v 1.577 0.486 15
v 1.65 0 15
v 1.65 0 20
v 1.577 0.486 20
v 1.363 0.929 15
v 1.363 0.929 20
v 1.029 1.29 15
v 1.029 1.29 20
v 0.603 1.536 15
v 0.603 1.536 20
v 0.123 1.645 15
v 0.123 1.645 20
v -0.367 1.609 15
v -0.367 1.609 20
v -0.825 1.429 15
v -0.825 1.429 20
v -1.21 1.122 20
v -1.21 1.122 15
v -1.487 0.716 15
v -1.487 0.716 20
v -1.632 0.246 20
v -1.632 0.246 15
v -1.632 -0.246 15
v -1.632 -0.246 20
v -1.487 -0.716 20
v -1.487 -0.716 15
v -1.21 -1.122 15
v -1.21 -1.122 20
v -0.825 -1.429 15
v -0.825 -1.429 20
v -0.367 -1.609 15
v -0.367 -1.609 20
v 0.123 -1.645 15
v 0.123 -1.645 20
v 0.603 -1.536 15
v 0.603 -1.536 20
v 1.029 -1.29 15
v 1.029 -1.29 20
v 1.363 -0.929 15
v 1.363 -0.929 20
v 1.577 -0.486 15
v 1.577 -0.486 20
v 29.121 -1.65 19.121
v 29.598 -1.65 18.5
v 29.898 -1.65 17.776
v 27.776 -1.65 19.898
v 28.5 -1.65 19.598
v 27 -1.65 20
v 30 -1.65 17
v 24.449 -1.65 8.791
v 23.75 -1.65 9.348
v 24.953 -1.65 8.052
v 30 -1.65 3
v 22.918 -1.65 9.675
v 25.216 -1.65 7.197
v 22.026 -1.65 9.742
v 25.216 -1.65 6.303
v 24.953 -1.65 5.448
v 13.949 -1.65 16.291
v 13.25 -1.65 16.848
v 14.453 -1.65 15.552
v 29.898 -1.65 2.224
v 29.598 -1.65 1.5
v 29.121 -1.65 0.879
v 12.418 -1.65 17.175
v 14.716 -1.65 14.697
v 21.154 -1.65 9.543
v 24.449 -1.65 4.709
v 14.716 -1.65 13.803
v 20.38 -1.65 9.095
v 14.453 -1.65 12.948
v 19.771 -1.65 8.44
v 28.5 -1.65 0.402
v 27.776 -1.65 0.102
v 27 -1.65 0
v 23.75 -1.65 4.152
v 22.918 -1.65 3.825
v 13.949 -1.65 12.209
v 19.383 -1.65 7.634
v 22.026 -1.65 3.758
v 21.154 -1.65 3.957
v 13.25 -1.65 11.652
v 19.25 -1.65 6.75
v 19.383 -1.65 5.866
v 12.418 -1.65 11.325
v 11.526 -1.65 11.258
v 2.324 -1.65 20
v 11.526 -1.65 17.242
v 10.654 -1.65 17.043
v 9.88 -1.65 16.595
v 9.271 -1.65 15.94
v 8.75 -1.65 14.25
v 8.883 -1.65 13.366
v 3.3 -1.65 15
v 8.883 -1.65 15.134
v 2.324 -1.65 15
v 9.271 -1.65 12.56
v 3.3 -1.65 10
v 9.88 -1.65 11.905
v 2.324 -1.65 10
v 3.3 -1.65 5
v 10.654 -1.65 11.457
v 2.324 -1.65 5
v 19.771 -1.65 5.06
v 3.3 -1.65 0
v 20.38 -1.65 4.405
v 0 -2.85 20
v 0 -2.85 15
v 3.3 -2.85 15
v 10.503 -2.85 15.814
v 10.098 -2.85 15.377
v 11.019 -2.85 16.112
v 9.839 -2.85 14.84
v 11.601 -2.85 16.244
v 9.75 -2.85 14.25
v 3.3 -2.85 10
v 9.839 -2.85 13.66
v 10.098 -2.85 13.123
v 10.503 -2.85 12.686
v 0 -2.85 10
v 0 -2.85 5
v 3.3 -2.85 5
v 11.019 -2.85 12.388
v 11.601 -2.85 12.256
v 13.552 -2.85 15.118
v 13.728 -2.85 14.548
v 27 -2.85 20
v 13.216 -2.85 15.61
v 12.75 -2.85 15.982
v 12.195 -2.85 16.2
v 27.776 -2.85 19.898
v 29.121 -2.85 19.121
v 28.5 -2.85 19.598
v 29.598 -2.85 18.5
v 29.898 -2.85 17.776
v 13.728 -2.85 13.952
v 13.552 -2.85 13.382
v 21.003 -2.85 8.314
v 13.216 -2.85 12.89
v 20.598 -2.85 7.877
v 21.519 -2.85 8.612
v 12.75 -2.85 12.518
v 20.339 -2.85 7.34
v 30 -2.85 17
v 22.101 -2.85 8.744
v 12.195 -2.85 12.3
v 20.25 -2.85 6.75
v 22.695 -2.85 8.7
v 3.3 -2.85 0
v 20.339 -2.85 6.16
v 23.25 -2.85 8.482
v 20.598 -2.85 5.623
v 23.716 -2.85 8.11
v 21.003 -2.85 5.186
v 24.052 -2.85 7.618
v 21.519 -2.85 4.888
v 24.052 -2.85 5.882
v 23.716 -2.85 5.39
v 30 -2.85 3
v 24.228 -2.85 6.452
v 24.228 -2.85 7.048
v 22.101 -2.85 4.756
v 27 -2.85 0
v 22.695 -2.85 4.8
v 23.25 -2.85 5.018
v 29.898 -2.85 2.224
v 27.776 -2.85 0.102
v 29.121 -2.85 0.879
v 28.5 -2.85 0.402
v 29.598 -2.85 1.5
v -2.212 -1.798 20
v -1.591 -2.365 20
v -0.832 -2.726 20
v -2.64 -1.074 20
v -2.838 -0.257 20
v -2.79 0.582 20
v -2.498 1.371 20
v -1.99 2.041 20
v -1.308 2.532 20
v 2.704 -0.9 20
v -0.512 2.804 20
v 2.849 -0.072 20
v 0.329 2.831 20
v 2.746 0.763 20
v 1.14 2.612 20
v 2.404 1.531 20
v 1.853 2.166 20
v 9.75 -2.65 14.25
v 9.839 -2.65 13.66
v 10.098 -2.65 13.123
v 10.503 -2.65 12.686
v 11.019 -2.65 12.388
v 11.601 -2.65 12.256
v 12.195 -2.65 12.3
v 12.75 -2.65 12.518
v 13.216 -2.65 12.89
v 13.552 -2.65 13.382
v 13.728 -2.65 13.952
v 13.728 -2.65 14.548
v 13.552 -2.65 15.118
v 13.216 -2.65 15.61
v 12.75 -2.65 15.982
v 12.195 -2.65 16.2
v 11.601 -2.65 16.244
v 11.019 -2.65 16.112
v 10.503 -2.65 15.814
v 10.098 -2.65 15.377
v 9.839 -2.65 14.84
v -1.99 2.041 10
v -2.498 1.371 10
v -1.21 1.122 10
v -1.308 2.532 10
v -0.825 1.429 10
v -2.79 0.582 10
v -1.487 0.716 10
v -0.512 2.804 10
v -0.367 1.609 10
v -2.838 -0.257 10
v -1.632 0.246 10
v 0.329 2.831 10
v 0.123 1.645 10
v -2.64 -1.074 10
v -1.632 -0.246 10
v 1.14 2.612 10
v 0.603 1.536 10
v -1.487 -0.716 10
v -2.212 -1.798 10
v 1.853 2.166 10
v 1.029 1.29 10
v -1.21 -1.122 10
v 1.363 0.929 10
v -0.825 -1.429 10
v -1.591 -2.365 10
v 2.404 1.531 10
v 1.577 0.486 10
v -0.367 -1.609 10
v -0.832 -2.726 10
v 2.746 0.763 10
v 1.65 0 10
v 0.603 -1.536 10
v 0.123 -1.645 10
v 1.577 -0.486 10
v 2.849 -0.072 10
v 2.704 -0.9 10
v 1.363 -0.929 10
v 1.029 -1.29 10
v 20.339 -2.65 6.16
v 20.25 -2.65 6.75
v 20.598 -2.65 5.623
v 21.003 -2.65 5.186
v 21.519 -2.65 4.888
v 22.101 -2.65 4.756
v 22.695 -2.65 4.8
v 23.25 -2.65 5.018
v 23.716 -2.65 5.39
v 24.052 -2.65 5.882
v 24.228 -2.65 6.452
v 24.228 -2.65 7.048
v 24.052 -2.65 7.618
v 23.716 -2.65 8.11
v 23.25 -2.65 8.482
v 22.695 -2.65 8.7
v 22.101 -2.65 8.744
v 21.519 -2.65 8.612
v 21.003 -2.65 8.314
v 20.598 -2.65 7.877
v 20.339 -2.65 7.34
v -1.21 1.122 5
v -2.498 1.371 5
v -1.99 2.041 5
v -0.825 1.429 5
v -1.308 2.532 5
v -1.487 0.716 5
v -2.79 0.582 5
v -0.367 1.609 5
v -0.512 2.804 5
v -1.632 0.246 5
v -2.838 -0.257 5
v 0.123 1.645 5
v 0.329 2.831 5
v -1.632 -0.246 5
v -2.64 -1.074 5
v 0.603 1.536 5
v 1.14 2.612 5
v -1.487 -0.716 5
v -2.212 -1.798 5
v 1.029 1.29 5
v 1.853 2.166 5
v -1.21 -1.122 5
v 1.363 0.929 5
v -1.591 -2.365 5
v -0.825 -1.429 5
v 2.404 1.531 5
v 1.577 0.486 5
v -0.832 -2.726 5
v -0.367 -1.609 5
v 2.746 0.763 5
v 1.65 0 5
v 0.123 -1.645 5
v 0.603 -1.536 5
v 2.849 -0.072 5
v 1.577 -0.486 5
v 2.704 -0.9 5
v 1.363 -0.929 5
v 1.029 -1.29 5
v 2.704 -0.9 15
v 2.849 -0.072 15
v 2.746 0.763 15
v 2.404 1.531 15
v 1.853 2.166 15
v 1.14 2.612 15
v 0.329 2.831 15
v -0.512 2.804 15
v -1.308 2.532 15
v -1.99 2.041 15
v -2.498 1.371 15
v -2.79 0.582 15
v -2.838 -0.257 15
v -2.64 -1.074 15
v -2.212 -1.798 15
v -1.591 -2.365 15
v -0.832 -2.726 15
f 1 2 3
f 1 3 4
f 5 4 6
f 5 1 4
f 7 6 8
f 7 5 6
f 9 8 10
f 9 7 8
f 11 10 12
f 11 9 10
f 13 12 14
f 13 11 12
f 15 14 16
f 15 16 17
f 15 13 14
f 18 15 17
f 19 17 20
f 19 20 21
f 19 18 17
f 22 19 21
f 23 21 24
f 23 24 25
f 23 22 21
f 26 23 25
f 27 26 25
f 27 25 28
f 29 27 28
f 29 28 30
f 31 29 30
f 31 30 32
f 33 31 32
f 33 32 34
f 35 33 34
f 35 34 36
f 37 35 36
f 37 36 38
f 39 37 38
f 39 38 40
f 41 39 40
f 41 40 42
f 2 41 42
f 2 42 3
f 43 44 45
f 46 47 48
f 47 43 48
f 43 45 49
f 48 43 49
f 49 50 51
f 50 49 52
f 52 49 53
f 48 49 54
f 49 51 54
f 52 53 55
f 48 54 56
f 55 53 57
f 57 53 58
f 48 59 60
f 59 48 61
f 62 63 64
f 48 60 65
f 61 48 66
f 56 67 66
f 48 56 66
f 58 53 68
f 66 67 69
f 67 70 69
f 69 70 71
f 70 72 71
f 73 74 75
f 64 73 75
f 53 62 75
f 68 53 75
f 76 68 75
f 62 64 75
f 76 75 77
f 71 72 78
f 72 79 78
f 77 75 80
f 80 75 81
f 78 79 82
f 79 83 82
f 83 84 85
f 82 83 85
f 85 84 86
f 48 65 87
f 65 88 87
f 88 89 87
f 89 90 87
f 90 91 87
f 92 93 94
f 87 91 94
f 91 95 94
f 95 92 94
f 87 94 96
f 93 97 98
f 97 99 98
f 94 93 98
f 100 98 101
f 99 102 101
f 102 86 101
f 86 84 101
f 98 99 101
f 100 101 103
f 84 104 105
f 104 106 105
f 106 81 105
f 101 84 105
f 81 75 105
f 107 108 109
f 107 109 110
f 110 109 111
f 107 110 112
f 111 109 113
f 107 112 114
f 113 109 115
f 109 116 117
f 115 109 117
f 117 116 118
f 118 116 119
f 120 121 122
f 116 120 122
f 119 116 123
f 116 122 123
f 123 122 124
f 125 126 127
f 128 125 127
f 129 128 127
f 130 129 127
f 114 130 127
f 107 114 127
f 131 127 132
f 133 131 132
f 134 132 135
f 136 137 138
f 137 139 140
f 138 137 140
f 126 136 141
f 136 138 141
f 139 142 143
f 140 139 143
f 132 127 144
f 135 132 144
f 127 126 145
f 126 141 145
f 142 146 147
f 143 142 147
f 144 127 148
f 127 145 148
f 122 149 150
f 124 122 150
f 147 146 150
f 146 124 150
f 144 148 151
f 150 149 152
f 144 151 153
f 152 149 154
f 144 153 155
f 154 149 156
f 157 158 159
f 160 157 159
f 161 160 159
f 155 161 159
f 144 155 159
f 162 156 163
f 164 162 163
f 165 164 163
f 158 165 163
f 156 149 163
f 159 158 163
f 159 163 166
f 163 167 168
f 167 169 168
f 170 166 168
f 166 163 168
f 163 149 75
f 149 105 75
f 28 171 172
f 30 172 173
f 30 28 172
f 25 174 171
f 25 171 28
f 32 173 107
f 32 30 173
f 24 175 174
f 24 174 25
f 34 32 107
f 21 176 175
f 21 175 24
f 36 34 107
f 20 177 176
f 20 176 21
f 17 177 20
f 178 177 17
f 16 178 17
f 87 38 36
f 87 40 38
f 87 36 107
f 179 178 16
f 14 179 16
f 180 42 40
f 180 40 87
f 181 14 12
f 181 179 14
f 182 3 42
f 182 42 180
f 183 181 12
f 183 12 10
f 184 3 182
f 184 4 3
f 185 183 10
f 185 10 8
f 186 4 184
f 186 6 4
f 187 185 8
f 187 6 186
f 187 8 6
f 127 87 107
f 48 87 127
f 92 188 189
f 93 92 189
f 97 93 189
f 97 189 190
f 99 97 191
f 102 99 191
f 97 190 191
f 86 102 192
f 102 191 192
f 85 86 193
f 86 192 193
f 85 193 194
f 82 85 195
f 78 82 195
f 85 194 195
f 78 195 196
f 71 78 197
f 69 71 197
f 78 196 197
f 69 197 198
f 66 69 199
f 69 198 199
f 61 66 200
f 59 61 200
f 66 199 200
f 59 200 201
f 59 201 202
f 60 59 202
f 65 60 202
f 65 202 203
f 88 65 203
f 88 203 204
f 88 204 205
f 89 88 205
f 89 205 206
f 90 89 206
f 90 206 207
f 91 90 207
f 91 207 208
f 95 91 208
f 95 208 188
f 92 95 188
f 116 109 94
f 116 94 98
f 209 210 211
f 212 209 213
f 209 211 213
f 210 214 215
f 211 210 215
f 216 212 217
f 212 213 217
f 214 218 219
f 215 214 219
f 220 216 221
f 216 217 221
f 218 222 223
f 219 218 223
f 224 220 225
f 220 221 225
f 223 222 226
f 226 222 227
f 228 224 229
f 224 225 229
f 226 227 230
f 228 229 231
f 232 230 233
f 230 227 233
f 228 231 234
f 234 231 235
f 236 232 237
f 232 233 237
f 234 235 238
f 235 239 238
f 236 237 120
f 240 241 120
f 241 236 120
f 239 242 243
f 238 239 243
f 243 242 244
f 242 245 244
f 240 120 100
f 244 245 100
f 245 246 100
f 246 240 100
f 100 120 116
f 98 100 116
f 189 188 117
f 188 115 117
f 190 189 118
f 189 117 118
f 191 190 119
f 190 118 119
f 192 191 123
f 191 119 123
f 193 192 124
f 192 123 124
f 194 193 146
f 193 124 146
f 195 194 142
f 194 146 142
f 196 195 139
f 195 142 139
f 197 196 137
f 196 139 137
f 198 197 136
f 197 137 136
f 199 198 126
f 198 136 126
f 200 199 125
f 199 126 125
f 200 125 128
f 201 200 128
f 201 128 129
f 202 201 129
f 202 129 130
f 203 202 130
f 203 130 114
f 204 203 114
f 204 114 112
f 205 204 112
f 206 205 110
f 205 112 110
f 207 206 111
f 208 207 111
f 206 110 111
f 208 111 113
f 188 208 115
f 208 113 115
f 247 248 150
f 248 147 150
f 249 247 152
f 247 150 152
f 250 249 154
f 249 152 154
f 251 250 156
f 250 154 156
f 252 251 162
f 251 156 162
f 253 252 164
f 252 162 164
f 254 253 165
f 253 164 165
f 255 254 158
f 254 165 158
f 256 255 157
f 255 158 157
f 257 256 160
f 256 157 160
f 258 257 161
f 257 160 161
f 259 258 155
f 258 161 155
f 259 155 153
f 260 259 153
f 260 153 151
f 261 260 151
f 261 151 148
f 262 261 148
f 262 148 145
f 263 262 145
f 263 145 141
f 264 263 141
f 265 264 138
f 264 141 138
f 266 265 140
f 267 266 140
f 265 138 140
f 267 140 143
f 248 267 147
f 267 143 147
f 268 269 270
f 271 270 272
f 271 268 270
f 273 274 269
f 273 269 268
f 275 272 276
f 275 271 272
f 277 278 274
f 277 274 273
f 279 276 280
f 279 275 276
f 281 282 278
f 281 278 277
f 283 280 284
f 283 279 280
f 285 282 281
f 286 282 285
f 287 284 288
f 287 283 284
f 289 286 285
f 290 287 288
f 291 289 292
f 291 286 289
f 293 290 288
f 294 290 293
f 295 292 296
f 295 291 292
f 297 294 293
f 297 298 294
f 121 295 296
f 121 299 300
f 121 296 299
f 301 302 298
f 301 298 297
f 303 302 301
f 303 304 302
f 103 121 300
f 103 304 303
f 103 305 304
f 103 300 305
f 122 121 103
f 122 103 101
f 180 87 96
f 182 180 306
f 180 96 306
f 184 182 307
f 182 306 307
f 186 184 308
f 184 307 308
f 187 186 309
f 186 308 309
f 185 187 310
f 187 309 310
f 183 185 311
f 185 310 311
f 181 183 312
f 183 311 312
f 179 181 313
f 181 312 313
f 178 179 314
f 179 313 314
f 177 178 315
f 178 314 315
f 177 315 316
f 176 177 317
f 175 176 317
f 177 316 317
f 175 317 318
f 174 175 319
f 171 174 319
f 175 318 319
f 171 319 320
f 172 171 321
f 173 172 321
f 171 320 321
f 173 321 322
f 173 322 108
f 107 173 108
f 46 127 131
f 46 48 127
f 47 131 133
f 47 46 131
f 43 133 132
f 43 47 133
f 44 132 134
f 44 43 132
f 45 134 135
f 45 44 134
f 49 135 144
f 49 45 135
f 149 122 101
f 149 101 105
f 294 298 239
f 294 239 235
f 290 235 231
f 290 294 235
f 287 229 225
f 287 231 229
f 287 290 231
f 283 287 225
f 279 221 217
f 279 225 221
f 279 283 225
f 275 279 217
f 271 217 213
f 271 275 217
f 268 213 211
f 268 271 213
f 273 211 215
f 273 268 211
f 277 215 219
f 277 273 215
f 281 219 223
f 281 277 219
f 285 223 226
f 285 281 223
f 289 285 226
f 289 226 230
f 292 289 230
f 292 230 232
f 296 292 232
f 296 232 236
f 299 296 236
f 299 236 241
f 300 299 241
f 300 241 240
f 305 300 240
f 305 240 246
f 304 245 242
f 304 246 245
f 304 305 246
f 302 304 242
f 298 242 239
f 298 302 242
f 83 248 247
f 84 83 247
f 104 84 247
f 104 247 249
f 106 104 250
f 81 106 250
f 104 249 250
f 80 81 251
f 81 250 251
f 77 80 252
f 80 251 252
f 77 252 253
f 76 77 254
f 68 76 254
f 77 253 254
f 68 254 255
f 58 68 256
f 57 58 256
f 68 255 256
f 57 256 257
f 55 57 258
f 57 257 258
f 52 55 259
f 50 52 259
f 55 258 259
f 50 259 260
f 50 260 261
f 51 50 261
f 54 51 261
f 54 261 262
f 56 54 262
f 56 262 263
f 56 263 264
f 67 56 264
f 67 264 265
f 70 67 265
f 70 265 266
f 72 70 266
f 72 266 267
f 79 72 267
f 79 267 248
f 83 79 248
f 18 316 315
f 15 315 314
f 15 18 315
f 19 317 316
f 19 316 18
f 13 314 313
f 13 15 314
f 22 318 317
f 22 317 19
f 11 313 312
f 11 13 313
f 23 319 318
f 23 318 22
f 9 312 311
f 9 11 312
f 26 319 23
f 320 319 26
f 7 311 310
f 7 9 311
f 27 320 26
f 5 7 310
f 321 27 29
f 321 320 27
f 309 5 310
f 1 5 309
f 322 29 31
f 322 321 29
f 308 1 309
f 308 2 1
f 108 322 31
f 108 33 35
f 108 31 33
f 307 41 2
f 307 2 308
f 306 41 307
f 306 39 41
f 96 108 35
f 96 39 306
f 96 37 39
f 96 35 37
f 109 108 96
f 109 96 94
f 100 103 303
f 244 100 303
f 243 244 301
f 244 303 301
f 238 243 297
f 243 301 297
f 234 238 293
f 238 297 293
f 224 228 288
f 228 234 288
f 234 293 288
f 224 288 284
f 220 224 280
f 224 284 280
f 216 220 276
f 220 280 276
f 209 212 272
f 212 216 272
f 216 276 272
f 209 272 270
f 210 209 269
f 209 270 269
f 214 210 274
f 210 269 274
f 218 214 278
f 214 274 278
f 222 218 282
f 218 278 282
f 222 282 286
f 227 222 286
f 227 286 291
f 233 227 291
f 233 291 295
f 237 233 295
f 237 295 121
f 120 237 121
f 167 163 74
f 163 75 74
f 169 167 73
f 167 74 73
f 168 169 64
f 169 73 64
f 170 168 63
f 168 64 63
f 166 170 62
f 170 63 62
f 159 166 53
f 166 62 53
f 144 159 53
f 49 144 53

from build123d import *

# Parameters (mm, degrees)
ESQUISSE1_R                  = 1.65
BOSS_EXTRU_1_DEPTH           = 20
ENL_V_MAT_EXTRU_3_DEPTH      = 20
ENL_V_MAT_EXTRU_3_DEPTH_BACK = 20
ESQUISSE2_W                  = 10.952034034
ESQUISSE2_H                  = 5
CONG_1_R                     = 3
D_GAGEMENT_M41_D             = 4
D_GAGEMENT_M41_DEPTH         = 10
D_GAGEMENT_M41_CSINK_D       = 6
D_GAGEMENT_M41_CSINK_ANGLE   = 90
D_GAGEMENT_M41_TIP           = 1.201721238


with BuildPart() as part:
    # Esquisse1 → Boss.-Extru.1 (new body)
    with BuildSketch(Plane.XY):
        with BuildLine():
            Line((30, -1.65), (2.323790008, -1.65))
            ThreePointArc((2.323790008, -1.65), (-1.307669683, 2.532291452), (0, -2.85))
            Line((0, -2.85), (30, -2.85))
            Line((30, -2.85), (30, -1.65))
        make_face()
        Circle(ESQUISSE1_R, mode=Mode.SUBTRACT)
    extrude(amount=BOSS_EXTRU_1_DEPTH)

    # Esquisse2 → Enlèv. mat.-Extru.3 (cut, two sides: drawn at the far end of the back side and taken through both)
    with BuildSketch(Plane(origin=(0, -1.65, 0), x_dir=(1, 0, 0), z_dir=(0, 1, 0)).offset(-ENL_V_MAT_EXTRU_3_DEPTH_BACK)):
        with Locations((-2.176017017, -2.5)):
            Rectangle(ESQUISSE2_W, ESQUISSE2_H)
        with Locations((-2.176017017, -12.5)):
            Rectangle(ESQUISSE2_W, ESQUISSE2_H)
    extrude(amount=ENL_V_MAT_EXTRU_3_DEPTH + ENL_V_MAT_EXTRU_3_DEPTH_BACK, mode=Mode.SUBTRACT)

    # Congé1
    cong_1_edges = [part.edges().sort_by_distance(p)[0] for p in [
        (30, -2.25, 20),
        (30, -2.25, 0),
    ]]
    fillet(cong_1_edges, radius=CONG_1_R)

    # Dégagement M41
    with Locations(Plane(origin=(0, -1.65, 0), x_dir=(1, 0, 0), z_dir=(0, 1, 0))):
        with Locations((11.75, -14.25), (22.25, -6.75)):
            CounterSinkHole(D_GAGEMENT_M41_D / 2, D_GAGEMENT_M41_CSINK_D / 2, depth=D_GAGEMENT_M41_DEPTH, counter_sink_angle=D_GAGEMENT_M41_CSINK_ANGLE)
            with Locations((0, 0, -(D_GAGEMENT_M41_DEPTH + D_GAGEMENT_M41_TIP / 2))):  # 118° drill point
                Cone(0, D_GAGEMENT_M41_D / 2, D_GAGEMENT_M41_TIP, mode=Mode.SUBTRACT)


solid = part.part
